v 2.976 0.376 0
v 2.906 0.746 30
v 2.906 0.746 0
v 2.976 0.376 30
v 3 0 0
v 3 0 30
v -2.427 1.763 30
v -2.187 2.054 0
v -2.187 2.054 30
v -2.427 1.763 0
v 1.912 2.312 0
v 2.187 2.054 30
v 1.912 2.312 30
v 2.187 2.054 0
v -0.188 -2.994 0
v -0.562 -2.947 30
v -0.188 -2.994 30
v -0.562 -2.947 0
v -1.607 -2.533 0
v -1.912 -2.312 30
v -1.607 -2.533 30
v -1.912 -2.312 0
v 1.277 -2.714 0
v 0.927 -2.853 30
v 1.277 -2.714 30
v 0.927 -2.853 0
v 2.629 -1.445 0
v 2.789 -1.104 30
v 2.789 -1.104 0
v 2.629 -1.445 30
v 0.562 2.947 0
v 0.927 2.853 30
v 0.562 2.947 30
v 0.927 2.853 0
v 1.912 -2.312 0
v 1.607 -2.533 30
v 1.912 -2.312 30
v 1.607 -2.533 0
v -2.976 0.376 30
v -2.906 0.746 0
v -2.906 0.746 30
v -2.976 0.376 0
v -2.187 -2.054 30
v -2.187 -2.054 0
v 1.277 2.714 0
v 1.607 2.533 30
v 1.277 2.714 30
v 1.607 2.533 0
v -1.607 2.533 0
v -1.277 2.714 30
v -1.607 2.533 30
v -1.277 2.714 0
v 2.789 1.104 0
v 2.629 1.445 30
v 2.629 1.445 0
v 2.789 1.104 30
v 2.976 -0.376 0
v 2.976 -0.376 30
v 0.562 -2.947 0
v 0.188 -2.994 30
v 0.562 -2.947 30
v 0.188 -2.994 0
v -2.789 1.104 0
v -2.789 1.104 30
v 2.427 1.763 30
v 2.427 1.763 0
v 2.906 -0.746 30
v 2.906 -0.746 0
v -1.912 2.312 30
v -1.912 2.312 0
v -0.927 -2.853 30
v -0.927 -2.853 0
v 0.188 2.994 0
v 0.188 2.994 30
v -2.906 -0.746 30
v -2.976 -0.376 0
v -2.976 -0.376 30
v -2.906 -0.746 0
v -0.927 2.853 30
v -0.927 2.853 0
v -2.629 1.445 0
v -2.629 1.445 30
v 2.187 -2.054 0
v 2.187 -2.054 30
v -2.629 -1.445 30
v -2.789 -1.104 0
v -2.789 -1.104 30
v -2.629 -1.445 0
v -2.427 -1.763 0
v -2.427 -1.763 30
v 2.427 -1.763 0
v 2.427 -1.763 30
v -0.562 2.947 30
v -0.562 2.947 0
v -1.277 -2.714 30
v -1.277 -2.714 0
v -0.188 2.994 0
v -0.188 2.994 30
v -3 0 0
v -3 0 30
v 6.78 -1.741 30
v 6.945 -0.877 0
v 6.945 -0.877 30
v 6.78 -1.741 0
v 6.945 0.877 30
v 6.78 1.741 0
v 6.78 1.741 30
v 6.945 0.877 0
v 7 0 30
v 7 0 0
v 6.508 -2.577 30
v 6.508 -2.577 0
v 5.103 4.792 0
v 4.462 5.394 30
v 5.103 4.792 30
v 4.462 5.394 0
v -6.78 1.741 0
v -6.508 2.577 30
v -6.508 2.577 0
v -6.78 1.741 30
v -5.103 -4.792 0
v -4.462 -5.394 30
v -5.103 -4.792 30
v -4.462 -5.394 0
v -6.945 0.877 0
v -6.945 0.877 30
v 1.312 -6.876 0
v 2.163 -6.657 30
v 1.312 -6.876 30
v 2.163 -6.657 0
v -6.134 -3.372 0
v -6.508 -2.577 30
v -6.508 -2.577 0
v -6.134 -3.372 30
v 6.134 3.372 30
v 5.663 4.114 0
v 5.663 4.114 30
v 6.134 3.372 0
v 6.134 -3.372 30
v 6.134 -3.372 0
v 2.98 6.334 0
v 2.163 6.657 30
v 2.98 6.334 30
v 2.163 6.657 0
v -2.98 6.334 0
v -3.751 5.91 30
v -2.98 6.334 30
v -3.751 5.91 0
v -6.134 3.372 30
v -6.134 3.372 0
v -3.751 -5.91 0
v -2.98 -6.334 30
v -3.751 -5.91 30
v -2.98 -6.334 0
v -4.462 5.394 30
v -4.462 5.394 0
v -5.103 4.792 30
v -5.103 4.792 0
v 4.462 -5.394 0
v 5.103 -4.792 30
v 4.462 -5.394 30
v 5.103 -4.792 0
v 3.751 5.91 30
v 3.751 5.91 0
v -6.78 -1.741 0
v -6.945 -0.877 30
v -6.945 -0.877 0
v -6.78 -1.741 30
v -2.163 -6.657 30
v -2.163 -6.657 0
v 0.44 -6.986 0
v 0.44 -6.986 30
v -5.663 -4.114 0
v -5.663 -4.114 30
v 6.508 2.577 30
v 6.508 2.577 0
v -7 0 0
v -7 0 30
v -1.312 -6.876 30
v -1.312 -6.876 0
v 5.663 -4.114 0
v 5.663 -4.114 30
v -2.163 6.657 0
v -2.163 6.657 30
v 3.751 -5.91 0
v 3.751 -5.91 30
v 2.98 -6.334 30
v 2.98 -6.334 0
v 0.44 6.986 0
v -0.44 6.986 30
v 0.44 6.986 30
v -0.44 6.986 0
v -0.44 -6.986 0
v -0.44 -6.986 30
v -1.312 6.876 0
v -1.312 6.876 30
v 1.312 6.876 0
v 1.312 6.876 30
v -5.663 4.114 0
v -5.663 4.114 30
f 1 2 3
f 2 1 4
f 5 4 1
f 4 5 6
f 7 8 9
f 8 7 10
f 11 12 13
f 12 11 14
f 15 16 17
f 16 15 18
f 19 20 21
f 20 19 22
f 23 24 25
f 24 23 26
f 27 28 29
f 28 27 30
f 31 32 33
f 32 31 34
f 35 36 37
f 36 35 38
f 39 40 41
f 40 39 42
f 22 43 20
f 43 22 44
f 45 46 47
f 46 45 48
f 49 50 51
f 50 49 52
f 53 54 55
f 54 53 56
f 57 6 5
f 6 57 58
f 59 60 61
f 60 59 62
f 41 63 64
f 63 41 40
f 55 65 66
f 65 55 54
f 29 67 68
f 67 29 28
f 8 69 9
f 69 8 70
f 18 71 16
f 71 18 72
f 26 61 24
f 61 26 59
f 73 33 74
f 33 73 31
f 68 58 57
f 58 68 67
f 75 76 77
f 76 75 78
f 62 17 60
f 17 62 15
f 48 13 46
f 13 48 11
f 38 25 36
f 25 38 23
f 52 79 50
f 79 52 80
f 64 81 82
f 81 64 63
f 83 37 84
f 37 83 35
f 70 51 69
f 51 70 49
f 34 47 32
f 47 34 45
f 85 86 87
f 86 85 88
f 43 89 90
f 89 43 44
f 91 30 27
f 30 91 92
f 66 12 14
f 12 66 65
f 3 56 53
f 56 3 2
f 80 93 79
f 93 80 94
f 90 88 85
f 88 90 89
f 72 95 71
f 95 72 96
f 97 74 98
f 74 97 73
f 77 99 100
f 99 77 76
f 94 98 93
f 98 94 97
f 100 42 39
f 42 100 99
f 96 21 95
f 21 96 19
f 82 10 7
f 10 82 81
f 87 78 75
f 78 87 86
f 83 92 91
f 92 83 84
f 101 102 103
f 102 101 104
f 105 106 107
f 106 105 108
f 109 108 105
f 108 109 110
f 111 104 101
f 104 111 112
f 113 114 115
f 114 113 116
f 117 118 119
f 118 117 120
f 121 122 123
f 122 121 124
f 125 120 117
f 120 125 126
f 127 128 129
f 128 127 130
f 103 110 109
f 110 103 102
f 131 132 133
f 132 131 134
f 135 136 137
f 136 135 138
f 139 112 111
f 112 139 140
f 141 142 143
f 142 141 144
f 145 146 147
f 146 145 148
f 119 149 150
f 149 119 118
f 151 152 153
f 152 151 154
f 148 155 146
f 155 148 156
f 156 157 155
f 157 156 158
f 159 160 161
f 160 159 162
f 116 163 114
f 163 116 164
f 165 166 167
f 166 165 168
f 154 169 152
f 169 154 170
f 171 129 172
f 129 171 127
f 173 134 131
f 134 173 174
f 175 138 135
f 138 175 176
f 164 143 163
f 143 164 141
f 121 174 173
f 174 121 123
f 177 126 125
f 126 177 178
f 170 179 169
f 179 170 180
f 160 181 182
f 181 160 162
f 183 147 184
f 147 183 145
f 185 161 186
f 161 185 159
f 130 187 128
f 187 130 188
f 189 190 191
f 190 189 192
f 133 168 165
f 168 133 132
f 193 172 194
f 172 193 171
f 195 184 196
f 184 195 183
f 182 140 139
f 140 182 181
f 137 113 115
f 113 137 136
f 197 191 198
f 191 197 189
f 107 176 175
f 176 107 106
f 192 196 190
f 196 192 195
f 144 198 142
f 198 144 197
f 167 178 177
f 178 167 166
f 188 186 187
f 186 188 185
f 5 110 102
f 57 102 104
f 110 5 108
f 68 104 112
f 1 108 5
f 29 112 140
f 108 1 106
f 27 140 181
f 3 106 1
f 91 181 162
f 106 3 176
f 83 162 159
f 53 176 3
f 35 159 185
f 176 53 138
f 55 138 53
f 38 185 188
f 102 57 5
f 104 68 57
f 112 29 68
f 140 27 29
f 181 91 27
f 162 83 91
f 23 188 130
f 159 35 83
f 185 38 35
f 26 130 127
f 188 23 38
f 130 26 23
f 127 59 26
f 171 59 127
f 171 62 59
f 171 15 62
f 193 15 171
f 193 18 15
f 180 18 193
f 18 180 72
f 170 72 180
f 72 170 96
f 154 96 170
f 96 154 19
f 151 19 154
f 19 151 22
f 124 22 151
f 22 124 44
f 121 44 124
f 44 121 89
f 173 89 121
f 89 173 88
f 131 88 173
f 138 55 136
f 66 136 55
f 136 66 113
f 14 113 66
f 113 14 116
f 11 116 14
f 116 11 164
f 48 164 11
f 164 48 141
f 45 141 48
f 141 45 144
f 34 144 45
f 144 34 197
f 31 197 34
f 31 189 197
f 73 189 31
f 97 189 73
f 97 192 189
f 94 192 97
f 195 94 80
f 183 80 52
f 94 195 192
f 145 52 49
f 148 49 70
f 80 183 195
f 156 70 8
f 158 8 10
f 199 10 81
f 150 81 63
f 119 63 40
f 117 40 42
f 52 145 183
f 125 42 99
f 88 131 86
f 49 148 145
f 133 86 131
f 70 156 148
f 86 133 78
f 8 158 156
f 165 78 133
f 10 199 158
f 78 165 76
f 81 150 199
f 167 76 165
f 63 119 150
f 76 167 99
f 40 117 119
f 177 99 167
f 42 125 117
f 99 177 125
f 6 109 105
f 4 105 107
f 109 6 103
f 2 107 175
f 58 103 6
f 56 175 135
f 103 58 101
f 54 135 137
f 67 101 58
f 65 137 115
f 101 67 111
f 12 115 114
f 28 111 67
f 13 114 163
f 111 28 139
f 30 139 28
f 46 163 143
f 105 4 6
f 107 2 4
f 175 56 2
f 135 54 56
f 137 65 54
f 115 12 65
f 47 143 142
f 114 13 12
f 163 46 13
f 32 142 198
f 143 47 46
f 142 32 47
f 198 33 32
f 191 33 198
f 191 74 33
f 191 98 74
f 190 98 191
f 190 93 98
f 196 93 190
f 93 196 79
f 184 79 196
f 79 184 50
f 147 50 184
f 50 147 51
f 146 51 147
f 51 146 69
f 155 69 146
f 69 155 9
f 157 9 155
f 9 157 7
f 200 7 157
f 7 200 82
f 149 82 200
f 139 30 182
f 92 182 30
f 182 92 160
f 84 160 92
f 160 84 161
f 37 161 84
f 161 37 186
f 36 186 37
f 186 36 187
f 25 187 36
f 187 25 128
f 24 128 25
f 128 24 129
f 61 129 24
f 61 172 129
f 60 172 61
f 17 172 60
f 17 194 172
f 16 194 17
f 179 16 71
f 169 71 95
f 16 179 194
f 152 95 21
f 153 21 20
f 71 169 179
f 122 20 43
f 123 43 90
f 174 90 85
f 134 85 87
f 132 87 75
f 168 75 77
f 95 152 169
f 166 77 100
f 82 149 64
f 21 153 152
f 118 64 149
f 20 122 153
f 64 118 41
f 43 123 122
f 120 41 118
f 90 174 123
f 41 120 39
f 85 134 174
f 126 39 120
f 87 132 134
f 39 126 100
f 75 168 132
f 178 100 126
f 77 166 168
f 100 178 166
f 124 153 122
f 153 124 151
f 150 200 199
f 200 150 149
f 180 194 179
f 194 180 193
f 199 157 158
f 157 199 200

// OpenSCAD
$fn = 50;


difference() {
	union() {
		*color(alpha = 1.0000000000, c = "gray") {
			translate(v = [0, 7, 0]) {
				linear_extrude(height = 1) {
					text(font = "Arial:style=Bold", halign = "center", size = 4.5000000000, text = "COMMENT plate main", valign = "center");
				}
			}
		}
		cylinder(h = 30, r = 7.0000000000);
	}
	union() {
		*color(alpha = 1.0000000000, c = "gray") {
			translate(v = [0, 7, 0]) {
				linear_extrude(height = 1) {
					text(font = "Arial:style=Bold", halign = "center", size = 4.5000000000, text = "COMMENT holes main", valign = "center");
				}
			}
		}
		translate(v = [0, 0, -100]) {
			cylinder(h = 200, r = 3.0000000000);
		}
		translate(v = [0, 0, -100]) {
			cylinder(h = 200, r = 1.5000000000);
		}
	}
}
